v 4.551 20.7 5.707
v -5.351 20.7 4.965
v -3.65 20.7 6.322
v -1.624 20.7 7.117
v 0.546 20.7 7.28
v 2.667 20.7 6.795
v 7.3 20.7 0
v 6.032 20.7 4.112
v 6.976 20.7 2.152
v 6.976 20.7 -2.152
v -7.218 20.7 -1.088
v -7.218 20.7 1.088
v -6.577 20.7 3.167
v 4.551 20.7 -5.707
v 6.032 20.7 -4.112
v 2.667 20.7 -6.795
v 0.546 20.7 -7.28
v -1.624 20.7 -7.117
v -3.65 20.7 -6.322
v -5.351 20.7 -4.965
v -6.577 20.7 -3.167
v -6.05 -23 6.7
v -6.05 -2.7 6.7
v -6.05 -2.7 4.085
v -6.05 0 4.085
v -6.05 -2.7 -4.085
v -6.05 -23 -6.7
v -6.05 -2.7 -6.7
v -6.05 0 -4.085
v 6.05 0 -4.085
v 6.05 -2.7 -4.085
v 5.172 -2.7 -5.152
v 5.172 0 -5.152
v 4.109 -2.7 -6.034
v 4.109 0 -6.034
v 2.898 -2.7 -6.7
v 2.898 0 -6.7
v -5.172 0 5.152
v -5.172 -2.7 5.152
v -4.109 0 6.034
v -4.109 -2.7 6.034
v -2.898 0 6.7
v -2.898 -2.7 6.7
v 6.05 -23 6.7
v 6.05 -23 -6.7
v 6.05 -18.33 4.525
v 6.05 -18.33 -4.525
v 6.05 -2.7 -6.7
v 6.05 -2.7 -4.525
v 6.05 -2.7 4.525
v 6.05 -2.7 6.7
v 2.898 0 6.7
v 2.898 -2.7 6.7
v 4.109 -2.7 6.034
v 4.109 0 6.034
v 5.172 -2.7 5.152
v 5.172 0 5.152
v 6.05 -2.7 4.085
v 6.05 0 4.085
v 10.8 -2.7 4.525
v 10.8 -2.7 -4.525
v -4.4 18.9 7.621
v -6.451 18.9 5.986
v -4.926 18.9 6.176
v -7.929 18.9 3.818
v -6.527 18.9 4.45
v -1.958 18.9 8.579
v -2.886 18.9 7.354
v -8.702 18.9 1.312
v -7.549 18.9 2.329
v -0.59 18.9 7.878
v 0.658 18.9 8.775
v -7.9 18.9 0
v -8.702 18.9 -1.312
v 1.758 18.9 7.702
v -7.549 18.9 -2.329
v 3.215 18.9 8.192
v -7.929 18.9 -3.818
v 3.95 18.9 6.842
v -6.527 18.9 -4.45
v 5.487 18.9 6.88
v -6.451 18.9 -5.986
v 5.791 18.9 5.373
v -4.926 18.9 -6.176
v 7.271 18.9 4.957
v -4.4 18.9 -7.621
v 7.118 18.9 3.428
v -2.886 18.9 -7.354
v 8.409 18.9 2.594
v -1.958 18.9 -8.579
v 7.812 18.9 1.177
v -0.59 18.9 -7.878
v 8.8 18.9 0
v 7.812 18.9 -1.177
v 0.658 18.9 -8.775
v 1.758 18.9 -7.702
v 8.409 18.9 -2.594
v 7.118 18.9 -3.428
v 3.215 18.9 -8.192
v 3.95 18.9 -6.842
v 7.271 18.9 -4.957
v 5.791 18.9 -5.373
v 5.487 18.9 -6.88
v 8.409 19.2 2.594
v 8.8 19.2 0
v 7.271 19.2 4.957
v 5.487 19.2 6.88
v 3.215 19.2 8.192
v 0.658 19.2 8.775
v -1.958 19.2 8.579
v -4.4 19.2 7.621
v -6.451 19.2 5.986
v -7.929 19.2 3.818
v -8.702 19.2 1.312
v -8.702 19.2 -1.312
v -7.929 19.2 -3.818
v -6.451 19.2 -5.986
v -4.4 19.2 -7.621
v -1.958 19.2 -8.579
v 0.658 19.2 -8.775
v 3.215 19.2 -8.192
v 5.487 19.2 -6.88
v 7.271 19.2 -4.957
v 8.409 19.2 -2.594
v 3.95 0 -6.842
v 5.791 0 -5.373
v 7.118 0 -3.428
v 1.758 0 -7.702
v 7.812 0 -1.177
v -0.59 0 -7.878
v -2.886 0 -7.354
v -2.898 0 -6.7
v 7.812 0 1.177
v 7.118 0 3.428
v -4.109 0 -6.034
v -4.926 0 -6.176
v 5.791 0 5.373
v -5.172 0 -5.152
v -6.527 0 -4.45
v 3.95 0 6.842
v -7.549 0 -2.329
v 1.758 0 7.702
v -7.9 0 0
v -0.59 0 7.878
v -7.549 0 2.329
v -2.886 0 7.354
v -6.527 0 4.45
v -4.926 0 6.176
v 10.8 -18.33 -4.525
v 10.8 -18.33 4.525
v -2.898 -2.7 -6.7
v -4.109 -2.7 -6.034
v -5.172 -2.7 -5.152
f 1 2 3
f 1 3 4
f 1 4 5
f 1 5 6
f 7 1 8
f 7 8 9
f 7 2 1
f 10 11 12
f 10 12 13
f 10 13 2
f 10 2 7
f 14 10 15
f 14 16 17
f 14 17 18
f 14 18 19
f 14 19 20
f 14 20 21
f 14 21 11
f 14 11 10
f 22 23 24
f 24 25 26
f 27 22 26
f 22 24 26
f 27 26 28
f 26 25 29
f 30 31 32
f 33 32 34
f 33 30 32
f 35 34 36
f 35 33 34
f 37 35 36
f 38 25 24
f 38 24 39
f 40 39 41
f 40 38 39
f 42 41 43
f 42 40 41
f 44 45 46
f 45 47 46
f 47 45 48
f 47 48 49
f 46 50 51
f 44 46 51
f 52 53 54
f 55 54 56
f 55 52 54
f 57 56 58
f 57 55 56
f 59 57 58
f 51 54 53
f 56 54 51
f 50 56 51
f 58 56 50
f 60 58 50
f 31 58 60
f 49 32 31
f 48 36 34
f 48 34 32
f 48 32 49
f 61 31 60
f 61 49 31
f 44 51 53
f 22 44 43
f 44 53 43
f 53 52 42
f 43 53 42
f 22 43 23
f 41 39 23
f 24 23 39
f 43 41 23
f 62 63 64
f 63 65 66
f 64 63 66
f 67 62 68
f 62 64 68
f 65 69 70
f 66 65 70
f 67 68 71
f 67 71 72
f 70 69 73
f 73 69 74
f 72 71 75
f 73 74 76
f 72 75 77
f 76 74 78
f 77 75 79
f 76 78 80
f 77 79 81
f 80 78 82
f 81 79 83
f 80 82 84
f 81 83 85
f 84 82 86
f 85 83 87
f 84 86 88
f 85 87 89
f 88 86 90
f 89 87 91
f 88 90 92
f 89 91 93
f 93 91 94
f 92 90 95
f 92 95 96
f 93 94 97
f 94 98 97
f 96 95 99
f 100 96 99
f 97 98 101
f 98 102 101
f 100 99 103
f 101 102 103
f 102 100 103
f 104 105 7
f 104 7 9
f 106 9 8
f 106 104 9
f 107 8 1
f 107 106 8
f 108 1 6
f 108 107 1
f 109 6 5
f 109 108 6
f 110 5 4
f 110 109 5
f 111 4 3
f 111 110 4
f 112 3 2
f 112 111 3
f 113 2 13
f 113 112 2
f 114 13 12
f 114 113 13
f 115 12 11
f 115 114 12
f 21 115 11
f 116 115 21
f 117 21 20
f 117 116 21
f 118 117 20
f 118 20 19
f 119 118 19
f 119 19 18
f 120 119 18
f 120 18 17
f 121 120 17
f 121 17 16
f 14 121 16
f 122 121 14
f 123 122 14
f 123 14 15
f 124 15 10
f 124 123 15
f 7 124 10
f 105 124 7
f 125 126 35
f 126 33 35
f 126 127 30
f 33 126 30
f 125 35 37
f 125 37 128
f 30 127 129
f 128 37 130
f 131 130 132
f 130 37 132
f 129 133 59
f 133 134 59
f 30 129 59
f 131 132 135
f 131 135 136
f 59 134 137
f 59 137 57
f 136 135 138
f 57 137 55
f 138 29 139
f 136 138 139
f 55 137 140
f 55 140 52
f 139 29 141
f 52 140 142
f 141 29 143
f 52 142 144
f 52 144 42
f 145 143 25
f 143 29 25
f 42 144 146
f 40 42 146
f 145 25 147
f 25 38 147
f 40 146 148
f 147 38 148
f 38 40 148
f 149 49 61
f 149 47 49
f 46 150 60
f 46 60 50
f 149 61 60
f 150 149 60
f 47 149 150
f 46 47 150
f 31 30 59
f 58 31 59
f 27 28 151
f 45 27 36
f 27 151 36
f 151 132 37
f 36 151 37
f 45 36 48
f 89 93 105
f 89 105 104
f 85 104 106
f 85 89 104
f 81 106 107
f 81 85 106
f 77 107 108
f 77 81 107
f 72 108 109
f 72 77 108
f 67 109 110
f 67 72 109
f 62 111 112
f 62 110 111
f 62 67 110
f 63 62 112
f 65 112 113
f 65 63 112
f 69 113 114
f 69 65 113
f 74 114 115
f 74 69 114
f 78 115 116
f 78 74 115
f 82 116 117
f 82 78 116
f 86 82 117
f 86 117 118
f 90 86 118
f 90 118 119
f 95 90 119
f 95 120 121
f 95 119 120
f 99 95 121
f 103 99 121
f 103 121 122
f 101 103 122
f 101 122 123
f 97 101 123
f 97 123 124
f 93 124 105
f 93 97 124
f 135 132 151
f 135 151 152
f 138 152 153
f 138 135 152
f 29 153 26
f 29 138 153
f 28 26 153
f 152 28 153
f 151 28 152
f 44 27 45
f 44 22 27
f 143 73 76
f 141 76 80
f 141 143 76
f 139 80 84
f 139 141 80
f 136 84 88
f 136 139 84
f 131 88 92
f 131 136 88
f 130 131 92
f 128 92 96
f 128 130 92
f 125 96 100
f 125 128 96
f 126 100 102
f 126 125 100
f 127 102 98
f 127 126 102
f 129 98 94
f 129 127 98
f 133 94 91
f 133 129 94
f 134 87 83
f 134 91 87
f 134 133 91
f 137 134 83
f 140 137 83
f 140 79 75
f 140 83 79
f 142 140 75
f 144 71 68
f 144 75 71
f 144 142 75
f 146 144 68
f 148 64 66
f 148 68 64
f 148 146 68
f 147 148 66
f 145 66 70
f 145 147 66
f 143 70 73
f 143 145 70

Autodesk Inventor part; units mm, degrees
ref_plane "YZ Plane" through (0, 0, 0) normal (1, 0, 0) x (0, 1, 0)
ref_plane "XZ Plane" through (0, 0, 0) normal (0, 1, 0) x (-1, 0, 0)
ref_plane "XY Plane" through (0, 0, 0) normal (0, 0, 1) x (1, 0, 0)
sketch "Sketch1" plane through (0, 0, 0) normal (0, 1, 0) x (-1, 0, 0)
  circle A0 centre (0, 0) radius 7.9
  dimension "d0" = 15.8
extrude "Extrusion1" add sketch "Sketch1" along normal blind 18.9
sketch "Sketch2" plane through (0, 18.9, 0) normal (0, 1, 0) x (1, 0, 0)
  circle A0 centre (0, 0) radius 8.8
  dimension "d3" = 17.6
extrude "Extrusion2" add sketch "Sketch2" along normal blind 1.8
chamfer "Chamfer1" distance 1.5 angle 45 1 edges at (-8.8, 20.7, 0)
sketch "Sketch3" plane through (0, 0, 0) normal (0, -1, 0) x (1, 0, 0)
  line L0 (6.05, 6.7) -> (-6.05, 6.7)
  line L1 (-6.05, 6.7) -> (-6.05, -6.7)
  line L2 (-6.05, -6.7) -> (6.05, -6.7)
  line L3 (6.05, -6.7) -> (6.05, 6.7)
  line L4 (6.05, 6.7) -> (-6.05, -6.7) construction
  line L5 (-6.05, 6.7) -> (6.05, -6.7) construction
  point P0 (0, 0)
  dimension "d9" = 12.1
  dimension "d10" = 13.4
extrude "Extrusion3" add sketch "Sketch3" along normal blind 23
sketch "Sketch4" plane through (0, -23, 0) normal (0, -1, 0) x (1, 0, 0)
  line L0 (6.05, -6.7) -> (6.05, 6.7) projected
  line L1 (10.8, 4.525) -> (1.3, 4.525)
  line L2 (1.3, 4.525) -> (1.3, -4.525)
  line L3 (1.3, -4.525) -> (10.8, -4.525)
  line L4 (10.8, -4.525) -> (10.8, 4.525)
  line L5 (6.05, 5.0801) -> (6.05, -5.0801) projected
  line L6 (10.8, 4.525) -> (1.3, -4.525) construction
  line L7 (1.3, 4.525) -> (10.8, -4.525) construction
  point P0 (0, 0)
  point P1 (6.05, 0)
  dimension "d13" = 9.5
  dimension "d14" = 9.05
extrude "Extrusion4" add sketch "Sketch4" against normal blind 20.3
sketch "Sketch5" plane through (10.8, -23, 4.525) normal (1, 0, 0) x (0, 0, -1)
  line L0 (9.05, 0) -> (0, 0) projected
  line L1 (9.05, 4.67) -> (0, 4.67)
  line L2 (0, 4.67) -> (9.05, 4.67)
  line L3 (9.05, 4.67) -> (9.05, 0)
  line L4 (9.05, 0) -> (0, 0)
  line L5 (0, 0) -> (0, 4.67)
  point P0 (4.525, 23)
  point P1 (9.05, 4.67)
  dimension "d17" = 4.67
extrude "Extrusion5" cut sketch "Sketch5" against normal up to surface (4.75 mm away)
sketch "Sketch6" plane through (0, 0, 0) normal (0, 1, 0) x (1, 0, 0)
  circle A0 centre (0, 0) radius 7.3 projected
  circle A1 centre (0, 0) radius 8.35
  line L0 (6.05, -6.7) -> (4.1857, -6.7) projected
  line L1 (-4.1857, -6.7) -> (4.1857, -6.7) projected
  line L2 (-4.1857, -6.7) -> (-6.05, -6.7) projected
  line L3 (6.05, -6.7) -> (-6.05, -6.7) projected
  line L4 (6.05, -4.525) -> (6.05, 4.525) projected
  line L5 (6.05, -4.525) -> (6.05, 4.525) projected
  line L6 (6.05, 6.7) -> (6.05, -6.7) projected
  line L7 (6.05, 6.7) -> (6.05, 5.0801) projected
  line L8 (6.05, -5.0801) -> (6.05, 5.0801) projected
  line L9 (6.05, -5.0801) -> (6.05, -6.7) projected
  line L10 (-6.05, 6.7) -> (-4.1857, 6.7) projected
  line L11 (4.1857, 6.7) -> (-4.1857, 6.7) projected
  line L12 (4.1857, 6.7) -> (6.05, 6.7) projected
  line L13 (-6.05, 6.7) -> (6.05, 6.7) projected
  line L14 (-6.05, -6.7) -> (-6.05, -5.0801) projected
  line L15 (-6.05, 5.0801) -> (-6.05, -5.0801) projected
  line L16 (-6.05, 5.0801) -> (-6.05, 6.7) projected
  line L17 (-6.05, -6.7) -> (-6.05, 6.7) projected
  point P0 (6.05, -5.755)
  point P1 (6.05, 5.755)
  point P2 (4.9832, 6.7)
  point P3 (-4.9832, 6.7)
  point P4 (-6.05, 5.755)
  point P5 (-6.05, -5.755)
  point P6 (-4.9832, -6.7)
  point P7 (4.9832, -6.7)
  dimension "d20" = 16.7
extrude "Extrusion6" cut sketch "Sketch6" against normal up to surface (2.7 mm away) contours A0 L4 L6 A1 | A0 L11 L12 A1 L6 L4 | L4 L6 A1 L0 L1 A0 | A0 L11 L10 A1 L12 | L1 L0 A1 L2 A0 | A0 L15 L16 A1 L10 L11 | L1 L2 A1 L14 L15 A0 | A0 L15 L14 A1 L16 | L12 L6 A1 | A1 L6 L0 | A1 L16 L10 | L2 L14 A1
properties part number "LEDpower_switch"
